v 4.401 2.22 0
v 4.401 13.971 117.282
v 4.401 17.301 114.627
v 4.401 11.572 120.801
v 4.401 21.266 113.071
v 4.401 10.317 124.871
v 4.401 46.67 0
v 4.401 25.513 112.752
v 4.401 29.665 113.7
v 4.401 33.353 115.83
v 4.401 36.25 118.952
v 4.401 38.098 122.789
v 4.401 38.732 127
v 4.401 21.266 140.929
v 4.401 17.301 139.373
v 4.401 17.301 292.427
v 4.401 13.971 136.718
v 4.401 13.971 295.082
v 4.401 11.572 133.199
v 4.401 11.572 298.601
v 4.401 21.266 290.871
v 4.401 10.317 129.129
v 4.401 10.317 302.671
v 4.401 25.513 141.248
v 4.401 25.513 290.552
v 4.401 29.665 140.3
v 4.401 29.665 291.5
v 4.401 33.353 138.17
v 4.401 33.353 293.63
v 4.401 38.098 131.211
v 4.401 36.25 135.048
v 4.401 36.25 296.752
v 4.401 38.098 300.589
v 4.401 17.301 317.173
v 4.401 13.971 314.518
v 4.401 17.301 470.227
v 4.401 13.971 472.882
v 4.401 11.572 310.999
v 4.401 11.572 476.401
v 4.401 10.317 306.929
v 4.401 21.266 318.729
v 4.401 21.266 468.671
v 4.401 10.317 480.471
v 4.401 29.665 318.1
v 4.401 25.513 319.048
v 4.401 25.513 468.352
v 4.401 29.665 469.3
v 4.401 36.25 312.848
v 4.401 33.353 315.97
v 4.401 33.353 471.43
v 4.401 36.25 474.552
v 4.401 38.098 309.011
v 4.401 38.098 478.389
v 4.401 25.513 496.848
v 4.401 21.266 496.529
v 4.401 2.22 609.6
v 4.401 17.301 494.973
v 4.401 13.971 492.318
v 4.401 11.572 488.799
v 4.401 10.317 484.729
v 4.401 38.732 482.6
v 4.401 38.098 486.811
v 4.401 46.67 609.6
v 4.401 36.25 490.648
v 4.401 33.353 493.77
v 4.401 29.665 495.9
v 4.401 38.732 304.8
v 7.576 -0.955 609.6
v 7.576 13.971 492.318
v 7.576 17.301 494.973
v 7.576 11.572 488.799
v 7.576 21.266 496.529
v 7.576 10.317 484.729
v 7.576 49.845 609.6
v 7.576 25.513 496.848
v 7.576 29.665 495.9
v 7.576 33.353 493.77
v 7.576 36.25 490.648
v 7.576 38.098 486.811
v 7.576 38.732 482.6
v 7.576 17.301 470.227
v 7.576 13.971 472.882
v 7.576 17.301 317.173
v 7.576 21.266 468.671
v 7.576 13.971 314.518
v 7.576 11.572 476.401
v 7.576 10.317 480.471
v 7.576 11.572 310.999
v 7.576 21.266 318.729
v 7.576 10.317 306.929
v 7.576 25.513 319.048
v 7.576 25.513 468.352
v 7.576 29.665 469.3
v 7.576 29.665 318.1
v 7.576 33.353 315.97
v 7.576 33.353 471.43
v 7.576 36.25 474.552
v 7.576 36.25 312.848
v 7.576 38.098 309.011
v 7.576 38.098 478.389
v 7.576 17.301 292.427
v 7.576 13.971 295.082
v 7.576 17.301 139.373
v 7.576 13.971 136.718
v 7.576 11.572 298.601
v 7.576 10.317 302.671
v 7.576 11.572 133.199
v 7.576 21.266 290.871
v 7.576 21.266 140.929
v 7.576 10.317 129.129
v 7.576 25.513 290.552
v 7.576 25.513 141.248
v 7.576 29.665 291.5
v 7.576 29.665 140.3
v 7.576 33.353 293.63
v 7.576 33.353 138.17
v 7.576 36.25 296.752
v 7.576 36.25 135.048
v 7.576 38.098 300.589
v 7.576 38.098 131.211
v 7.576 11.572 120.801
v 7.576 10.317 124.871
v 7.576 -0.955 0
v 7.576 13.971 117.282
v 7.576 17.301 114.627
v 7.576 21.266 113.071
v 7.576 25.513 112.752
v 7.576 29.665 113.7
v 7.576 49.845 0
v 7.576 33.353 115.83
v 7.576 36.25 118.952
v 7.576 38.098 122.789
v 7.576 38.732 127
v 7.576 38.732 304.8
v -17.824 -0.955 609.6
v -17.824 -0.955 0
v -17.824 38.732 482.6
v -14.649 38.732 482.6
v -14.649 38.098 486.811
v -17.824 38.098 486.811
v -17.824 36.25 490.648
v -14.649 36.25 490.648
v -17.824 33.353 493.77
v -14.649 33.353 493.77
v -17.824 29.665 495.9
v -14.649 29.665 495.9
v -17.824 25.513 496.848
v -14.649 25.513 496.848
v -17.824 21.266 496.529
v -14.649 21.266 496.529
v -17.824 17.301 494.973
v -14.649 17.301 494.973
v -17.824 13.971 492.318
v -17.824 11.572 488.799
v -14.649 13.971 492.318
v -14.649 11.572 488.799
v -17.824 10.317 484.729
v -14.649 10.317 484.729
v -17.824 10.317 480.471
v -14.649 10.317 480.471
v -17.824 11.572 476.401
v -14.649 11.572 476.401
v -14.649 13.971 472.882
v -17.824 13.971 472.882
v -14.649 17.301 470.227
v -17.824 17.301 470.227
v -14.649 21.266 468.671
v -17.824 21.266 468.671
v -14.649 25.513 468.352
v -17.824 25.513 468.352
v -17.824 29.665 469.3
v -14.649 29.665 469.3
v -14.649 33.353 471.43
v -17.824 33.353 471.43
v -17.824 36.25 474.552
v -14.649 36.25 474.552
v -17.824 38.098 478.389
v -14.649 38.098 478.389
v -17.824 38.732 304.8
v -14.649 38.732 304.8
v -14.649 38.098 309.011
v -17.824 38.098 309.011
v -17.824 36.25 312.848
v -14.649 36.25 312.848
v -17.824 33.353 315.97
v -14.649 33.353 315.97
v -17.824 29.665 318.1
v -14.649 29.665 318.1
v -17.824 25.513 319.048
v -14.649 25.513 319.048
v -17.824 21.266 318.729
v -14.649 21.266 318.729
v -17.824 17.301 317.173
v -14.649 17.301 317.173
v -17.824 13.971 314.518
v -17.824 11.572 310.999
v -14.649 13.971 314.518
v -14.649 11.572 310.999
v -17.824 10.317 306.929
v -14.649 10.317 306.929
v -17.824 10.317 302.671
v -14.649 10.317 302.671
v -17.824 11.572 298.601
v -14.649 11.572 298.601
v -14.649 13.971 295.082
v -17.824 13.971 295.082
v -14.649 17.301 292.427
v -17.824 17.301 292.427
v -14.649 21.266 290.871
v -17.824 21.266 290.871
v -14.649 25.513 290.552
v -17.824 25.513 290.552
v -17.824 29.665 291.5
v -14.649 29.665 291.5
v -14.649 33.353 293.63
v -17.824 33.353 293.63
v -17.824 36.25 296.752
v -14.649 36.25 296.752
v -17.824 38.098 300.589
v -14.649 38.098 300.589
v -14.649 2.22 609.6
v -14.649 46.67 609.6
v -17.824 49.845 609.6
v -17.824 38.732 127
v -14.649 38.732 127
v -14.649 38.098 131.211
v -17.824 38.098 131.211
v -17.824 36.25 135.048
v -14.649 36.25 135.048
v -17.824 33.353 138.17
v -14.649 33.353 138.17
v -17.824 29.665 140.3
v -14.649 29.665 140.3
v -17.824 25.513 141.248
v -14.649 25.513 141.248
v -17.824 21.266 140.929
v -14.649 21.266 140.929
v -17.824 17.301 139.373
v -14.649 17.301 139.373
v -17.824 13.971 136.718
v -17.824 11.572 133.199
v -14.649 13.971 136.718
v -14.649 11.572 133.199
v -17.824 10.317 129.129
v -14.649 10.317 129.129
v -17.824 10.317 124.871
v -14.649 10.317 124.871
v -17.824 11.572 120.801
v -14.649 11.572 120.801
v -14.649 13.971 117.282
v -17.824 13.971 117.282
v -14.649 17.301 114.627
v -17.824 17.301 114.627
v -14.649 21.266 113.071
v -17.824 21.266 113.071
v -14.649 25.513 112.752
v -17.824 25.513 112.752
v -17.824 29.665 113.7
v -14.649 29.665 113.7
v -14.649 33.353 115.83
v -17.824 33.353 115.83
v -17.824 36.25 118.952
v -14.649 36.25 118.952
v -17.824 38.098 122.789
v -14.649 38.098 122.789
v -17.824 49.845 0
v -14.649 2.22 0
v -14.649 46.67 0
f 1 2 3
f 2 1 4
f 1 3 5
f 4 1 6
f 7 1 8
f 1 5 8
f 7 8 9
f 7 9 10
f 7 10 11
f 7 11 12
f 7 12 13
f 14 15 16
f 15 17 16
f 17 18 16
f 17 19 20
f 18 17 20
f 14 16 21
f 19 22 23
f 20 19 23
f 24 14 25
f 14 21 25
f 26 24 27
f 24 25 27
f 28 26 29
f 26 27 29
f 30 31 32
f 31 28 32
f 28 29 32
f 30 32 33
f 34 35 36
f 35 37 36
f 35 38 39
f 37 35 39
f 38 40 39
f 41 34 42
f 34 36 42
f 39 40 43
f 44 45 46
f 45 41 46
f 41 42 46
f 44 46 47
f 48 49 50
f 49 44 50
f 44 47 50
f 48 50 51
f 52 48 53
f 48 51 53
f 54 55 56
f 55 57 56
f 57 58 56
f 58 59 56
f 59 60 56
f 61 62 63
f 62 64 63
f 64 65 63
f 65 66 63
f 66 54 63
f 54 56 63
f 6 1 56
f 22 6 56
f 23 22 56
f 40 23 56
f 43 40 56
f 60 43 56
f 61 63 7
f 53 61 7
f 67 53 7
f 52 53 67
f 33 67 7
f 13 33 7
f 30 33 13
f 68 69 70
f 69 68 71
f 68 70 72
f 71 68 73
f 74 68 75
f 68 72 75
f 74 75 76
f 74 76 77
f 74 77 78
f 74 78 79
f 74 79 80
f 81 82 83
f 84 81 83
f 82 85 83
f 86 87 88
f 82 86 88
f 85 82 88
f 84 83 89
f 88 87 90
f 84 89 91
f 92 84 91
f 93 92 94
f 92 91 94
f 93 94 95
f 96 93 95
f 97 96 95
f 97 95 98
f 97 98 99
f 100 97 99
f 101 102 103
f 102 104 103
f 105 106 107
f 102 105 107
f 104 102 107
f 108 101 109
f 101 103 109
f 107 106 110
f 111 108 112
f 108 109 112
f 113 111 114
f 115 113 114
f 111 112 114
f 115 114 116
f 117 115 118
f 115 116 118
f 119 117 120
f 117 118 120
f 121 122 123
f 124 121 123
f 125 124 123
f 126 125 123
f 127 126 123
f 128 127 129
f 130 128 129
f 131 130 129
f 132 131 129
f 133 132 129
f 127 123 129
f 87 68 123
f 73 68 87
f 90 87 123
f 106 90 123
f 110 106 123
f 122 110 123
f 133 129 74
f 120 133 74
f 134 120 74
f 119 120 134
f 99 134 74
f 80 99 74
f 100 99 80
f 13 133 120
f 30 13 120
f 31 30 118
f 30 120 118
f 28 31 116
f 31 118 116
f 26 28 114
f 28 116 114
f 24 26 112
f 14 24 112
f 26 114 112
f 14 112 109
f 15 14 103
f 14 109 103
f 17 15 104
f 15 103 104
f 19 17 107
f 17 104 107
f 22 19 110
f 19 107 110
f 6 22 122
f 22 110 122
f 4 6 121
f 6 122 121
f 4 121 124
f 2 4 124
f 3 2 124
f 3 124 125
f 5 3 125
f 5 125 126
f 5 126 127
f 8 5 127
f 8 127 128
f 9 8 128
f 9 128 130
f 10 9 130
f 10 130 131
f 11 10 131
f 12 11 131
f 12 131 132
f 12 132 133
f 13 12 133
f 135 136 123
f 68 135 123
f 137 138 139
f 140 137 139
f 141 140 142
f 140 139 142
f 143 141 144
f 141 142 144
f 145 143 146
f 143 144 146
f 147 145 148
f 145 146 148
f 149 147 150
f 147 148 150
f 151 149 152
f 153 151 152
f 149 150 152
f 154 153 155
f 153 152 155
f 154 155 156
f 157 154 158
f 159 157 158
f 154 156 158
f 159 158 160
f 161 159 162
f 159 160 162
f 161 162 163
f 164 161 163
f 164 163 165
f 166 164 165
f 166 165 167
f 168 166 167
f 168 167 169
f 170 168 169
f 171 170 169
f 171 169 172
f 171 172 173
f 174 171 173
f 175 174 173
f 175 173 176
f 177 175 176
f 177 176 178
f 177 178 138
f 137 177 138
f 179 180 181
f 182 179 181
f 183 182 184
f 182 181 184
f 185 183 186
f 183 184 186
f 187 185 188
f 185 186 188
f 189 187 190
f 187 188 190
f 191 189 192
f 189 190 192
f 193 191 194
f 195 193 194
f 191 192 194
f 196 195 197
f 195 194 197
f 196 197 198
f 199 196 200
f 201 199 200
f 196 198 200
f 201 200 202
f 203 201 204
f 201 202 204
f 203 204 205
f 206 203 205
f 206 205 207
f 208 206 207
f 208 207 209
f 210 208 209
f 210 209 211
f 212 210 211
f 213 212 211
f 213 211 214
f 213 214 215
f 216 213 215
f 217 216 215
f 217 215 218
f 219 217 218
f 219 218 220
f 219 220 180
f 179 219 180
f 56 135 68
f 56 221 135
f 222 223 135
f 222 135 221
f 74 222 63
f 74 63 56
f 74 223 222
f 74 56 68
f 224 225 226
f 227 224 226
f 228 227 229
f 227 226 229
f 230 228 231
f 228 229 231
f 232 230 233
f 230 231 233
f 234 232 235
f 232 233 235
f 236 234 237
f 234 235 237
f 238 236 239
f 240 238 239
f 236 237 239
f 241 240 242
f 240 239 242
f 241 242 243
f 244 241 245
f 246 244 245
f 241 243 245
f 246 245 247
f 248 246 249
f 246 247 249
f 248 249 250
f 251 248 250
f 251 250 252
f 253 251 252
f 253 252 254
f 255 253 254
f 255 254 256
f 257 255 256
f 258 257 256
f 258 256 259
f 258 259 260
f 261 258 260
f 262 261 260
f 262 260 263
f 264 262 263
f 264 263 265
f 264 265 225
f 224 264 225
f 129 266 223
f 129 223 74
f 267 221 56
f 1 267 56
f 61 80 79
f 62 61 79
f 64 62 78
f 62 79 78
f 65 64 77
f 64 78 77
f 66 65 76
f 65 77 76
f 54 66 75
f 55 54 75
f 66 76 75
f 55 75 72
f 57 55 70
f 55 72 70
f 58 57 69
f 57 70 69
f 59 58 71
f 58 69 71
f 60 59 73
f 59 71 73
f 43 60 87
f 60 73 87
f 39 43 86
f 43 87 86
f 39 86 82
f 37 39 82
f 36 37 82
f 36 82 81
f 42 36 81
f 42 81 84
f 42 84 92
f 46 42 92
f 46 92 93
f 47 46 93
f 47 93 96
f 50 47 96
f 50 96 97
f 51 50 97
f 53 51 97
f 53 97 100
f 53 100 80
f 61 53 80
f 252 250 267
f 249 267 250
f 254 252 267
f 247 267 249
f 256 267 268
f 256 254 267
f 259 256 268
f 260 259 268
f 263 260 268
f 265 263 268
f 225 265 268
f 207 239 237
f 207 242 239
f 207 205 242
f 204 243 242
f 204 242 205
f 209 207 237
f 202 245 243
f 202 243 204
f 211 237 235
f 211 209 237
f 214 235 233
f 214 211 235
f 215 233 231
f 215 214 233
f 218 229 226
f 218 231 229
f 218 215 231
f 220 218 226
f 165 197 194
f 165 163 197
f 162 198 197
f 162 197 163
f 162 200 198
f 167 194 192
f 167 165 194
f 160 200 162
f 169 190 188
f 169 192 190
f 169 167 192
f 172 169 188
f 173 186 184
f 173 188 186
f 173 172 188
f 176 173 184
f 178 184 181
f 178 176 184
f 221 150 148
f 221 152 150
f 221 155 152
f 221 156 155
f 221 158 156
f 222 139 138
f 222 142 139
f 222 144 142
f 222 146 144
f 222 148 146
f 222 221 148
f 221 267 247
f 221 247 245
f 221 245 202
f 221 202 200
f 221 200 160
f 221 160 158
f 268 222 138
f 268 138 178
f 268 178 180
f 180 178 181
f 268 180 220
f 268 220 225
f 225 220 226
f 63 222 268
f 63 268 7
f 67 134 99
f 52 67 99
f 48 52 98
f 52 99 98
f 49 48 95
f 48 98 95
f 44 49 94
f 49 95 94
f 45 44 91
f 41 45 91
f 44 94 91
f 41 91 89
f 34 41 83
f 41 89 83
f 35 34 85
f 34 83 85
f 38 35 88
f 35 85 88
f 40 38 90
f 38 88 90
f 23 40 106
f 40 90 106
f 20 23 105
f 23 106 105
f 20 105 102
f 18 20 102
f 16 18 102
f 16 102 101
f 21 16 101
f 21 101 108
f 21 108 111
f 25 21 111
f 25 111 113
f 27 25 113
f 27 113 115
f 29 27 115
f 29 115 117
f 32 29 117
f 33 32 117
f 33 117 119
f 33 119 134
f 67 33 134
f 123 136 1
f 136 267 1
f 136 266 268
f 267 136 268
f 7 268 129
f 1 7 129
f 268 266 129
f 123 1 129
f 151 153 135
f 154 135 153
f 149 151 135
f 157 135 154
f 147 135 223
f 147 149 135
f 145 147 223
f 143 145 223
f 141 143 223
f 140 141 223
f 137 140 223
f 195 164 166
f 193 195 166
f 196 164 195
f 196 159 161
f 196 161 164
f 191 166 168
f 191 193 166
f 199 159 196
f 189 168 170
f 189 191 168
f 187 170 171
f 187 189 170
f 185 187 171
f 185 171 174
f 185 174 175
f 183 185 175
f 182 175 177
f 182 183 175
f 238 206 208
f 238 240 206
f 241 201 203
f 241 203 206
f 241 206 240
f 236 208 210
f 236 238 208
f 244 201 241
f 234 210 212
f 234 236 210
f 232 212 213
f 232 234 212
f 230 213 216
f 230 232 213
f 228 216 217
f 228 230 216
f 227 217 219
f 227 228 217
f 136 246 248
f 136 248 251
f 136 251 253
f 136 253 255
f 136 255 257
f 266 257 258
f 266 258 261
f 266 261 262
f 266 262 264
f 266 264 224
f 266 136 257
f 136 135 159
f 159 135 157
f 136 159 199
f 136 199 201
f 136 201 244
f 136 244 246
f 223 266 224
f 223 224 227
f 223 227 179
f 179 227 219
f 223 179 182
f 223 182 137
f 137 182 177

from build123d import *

# Parameters (mm, degrees)
F0_W     = 25.4
F0_H     = 50.8
F1_DEPTH = 609.6
F2_W     = 19.05
F2_H     = 44.45
F3_DEPTH = 670.56
F4_R     = 14.2875
F5_DEPTH = 83.82


with BuildPart() as f1:
    # F0 (on Top) → F1 (new body)
    with BuildSketch(Plane.XY):
        with Locations((-5.123792, 24.444854)):
            Rectangle(F0_W, F0_H)
    extrude(amount=F1_DEPTH)

    # F2 (on face) → F3 (cut)
    with BuildSketch(Plane.XY.offset(609.6)):
        with Locations((-5.123792, 24.444854)):
            Rectangle(F2_W, F2_H)
    extrude(amount=-F3_DEPTH, mode=Mode.SUBTRACT)

    # F4 (on face) → F5 (cut)
    with BuildSketch(Plane.YZ.offset(7.576208)):
        with Locations((24.444854, 304.8)):
            Circle(F4_R)
        with Locations((24.444854, 482.6)):
            Circle(F4_R)
        with Locations((24.444854, 127)):
            Circle(F4_R)
    extrude(amount=-F5_DEPTH, mode=Mode.SUBTRACT)


solid = f1.part
